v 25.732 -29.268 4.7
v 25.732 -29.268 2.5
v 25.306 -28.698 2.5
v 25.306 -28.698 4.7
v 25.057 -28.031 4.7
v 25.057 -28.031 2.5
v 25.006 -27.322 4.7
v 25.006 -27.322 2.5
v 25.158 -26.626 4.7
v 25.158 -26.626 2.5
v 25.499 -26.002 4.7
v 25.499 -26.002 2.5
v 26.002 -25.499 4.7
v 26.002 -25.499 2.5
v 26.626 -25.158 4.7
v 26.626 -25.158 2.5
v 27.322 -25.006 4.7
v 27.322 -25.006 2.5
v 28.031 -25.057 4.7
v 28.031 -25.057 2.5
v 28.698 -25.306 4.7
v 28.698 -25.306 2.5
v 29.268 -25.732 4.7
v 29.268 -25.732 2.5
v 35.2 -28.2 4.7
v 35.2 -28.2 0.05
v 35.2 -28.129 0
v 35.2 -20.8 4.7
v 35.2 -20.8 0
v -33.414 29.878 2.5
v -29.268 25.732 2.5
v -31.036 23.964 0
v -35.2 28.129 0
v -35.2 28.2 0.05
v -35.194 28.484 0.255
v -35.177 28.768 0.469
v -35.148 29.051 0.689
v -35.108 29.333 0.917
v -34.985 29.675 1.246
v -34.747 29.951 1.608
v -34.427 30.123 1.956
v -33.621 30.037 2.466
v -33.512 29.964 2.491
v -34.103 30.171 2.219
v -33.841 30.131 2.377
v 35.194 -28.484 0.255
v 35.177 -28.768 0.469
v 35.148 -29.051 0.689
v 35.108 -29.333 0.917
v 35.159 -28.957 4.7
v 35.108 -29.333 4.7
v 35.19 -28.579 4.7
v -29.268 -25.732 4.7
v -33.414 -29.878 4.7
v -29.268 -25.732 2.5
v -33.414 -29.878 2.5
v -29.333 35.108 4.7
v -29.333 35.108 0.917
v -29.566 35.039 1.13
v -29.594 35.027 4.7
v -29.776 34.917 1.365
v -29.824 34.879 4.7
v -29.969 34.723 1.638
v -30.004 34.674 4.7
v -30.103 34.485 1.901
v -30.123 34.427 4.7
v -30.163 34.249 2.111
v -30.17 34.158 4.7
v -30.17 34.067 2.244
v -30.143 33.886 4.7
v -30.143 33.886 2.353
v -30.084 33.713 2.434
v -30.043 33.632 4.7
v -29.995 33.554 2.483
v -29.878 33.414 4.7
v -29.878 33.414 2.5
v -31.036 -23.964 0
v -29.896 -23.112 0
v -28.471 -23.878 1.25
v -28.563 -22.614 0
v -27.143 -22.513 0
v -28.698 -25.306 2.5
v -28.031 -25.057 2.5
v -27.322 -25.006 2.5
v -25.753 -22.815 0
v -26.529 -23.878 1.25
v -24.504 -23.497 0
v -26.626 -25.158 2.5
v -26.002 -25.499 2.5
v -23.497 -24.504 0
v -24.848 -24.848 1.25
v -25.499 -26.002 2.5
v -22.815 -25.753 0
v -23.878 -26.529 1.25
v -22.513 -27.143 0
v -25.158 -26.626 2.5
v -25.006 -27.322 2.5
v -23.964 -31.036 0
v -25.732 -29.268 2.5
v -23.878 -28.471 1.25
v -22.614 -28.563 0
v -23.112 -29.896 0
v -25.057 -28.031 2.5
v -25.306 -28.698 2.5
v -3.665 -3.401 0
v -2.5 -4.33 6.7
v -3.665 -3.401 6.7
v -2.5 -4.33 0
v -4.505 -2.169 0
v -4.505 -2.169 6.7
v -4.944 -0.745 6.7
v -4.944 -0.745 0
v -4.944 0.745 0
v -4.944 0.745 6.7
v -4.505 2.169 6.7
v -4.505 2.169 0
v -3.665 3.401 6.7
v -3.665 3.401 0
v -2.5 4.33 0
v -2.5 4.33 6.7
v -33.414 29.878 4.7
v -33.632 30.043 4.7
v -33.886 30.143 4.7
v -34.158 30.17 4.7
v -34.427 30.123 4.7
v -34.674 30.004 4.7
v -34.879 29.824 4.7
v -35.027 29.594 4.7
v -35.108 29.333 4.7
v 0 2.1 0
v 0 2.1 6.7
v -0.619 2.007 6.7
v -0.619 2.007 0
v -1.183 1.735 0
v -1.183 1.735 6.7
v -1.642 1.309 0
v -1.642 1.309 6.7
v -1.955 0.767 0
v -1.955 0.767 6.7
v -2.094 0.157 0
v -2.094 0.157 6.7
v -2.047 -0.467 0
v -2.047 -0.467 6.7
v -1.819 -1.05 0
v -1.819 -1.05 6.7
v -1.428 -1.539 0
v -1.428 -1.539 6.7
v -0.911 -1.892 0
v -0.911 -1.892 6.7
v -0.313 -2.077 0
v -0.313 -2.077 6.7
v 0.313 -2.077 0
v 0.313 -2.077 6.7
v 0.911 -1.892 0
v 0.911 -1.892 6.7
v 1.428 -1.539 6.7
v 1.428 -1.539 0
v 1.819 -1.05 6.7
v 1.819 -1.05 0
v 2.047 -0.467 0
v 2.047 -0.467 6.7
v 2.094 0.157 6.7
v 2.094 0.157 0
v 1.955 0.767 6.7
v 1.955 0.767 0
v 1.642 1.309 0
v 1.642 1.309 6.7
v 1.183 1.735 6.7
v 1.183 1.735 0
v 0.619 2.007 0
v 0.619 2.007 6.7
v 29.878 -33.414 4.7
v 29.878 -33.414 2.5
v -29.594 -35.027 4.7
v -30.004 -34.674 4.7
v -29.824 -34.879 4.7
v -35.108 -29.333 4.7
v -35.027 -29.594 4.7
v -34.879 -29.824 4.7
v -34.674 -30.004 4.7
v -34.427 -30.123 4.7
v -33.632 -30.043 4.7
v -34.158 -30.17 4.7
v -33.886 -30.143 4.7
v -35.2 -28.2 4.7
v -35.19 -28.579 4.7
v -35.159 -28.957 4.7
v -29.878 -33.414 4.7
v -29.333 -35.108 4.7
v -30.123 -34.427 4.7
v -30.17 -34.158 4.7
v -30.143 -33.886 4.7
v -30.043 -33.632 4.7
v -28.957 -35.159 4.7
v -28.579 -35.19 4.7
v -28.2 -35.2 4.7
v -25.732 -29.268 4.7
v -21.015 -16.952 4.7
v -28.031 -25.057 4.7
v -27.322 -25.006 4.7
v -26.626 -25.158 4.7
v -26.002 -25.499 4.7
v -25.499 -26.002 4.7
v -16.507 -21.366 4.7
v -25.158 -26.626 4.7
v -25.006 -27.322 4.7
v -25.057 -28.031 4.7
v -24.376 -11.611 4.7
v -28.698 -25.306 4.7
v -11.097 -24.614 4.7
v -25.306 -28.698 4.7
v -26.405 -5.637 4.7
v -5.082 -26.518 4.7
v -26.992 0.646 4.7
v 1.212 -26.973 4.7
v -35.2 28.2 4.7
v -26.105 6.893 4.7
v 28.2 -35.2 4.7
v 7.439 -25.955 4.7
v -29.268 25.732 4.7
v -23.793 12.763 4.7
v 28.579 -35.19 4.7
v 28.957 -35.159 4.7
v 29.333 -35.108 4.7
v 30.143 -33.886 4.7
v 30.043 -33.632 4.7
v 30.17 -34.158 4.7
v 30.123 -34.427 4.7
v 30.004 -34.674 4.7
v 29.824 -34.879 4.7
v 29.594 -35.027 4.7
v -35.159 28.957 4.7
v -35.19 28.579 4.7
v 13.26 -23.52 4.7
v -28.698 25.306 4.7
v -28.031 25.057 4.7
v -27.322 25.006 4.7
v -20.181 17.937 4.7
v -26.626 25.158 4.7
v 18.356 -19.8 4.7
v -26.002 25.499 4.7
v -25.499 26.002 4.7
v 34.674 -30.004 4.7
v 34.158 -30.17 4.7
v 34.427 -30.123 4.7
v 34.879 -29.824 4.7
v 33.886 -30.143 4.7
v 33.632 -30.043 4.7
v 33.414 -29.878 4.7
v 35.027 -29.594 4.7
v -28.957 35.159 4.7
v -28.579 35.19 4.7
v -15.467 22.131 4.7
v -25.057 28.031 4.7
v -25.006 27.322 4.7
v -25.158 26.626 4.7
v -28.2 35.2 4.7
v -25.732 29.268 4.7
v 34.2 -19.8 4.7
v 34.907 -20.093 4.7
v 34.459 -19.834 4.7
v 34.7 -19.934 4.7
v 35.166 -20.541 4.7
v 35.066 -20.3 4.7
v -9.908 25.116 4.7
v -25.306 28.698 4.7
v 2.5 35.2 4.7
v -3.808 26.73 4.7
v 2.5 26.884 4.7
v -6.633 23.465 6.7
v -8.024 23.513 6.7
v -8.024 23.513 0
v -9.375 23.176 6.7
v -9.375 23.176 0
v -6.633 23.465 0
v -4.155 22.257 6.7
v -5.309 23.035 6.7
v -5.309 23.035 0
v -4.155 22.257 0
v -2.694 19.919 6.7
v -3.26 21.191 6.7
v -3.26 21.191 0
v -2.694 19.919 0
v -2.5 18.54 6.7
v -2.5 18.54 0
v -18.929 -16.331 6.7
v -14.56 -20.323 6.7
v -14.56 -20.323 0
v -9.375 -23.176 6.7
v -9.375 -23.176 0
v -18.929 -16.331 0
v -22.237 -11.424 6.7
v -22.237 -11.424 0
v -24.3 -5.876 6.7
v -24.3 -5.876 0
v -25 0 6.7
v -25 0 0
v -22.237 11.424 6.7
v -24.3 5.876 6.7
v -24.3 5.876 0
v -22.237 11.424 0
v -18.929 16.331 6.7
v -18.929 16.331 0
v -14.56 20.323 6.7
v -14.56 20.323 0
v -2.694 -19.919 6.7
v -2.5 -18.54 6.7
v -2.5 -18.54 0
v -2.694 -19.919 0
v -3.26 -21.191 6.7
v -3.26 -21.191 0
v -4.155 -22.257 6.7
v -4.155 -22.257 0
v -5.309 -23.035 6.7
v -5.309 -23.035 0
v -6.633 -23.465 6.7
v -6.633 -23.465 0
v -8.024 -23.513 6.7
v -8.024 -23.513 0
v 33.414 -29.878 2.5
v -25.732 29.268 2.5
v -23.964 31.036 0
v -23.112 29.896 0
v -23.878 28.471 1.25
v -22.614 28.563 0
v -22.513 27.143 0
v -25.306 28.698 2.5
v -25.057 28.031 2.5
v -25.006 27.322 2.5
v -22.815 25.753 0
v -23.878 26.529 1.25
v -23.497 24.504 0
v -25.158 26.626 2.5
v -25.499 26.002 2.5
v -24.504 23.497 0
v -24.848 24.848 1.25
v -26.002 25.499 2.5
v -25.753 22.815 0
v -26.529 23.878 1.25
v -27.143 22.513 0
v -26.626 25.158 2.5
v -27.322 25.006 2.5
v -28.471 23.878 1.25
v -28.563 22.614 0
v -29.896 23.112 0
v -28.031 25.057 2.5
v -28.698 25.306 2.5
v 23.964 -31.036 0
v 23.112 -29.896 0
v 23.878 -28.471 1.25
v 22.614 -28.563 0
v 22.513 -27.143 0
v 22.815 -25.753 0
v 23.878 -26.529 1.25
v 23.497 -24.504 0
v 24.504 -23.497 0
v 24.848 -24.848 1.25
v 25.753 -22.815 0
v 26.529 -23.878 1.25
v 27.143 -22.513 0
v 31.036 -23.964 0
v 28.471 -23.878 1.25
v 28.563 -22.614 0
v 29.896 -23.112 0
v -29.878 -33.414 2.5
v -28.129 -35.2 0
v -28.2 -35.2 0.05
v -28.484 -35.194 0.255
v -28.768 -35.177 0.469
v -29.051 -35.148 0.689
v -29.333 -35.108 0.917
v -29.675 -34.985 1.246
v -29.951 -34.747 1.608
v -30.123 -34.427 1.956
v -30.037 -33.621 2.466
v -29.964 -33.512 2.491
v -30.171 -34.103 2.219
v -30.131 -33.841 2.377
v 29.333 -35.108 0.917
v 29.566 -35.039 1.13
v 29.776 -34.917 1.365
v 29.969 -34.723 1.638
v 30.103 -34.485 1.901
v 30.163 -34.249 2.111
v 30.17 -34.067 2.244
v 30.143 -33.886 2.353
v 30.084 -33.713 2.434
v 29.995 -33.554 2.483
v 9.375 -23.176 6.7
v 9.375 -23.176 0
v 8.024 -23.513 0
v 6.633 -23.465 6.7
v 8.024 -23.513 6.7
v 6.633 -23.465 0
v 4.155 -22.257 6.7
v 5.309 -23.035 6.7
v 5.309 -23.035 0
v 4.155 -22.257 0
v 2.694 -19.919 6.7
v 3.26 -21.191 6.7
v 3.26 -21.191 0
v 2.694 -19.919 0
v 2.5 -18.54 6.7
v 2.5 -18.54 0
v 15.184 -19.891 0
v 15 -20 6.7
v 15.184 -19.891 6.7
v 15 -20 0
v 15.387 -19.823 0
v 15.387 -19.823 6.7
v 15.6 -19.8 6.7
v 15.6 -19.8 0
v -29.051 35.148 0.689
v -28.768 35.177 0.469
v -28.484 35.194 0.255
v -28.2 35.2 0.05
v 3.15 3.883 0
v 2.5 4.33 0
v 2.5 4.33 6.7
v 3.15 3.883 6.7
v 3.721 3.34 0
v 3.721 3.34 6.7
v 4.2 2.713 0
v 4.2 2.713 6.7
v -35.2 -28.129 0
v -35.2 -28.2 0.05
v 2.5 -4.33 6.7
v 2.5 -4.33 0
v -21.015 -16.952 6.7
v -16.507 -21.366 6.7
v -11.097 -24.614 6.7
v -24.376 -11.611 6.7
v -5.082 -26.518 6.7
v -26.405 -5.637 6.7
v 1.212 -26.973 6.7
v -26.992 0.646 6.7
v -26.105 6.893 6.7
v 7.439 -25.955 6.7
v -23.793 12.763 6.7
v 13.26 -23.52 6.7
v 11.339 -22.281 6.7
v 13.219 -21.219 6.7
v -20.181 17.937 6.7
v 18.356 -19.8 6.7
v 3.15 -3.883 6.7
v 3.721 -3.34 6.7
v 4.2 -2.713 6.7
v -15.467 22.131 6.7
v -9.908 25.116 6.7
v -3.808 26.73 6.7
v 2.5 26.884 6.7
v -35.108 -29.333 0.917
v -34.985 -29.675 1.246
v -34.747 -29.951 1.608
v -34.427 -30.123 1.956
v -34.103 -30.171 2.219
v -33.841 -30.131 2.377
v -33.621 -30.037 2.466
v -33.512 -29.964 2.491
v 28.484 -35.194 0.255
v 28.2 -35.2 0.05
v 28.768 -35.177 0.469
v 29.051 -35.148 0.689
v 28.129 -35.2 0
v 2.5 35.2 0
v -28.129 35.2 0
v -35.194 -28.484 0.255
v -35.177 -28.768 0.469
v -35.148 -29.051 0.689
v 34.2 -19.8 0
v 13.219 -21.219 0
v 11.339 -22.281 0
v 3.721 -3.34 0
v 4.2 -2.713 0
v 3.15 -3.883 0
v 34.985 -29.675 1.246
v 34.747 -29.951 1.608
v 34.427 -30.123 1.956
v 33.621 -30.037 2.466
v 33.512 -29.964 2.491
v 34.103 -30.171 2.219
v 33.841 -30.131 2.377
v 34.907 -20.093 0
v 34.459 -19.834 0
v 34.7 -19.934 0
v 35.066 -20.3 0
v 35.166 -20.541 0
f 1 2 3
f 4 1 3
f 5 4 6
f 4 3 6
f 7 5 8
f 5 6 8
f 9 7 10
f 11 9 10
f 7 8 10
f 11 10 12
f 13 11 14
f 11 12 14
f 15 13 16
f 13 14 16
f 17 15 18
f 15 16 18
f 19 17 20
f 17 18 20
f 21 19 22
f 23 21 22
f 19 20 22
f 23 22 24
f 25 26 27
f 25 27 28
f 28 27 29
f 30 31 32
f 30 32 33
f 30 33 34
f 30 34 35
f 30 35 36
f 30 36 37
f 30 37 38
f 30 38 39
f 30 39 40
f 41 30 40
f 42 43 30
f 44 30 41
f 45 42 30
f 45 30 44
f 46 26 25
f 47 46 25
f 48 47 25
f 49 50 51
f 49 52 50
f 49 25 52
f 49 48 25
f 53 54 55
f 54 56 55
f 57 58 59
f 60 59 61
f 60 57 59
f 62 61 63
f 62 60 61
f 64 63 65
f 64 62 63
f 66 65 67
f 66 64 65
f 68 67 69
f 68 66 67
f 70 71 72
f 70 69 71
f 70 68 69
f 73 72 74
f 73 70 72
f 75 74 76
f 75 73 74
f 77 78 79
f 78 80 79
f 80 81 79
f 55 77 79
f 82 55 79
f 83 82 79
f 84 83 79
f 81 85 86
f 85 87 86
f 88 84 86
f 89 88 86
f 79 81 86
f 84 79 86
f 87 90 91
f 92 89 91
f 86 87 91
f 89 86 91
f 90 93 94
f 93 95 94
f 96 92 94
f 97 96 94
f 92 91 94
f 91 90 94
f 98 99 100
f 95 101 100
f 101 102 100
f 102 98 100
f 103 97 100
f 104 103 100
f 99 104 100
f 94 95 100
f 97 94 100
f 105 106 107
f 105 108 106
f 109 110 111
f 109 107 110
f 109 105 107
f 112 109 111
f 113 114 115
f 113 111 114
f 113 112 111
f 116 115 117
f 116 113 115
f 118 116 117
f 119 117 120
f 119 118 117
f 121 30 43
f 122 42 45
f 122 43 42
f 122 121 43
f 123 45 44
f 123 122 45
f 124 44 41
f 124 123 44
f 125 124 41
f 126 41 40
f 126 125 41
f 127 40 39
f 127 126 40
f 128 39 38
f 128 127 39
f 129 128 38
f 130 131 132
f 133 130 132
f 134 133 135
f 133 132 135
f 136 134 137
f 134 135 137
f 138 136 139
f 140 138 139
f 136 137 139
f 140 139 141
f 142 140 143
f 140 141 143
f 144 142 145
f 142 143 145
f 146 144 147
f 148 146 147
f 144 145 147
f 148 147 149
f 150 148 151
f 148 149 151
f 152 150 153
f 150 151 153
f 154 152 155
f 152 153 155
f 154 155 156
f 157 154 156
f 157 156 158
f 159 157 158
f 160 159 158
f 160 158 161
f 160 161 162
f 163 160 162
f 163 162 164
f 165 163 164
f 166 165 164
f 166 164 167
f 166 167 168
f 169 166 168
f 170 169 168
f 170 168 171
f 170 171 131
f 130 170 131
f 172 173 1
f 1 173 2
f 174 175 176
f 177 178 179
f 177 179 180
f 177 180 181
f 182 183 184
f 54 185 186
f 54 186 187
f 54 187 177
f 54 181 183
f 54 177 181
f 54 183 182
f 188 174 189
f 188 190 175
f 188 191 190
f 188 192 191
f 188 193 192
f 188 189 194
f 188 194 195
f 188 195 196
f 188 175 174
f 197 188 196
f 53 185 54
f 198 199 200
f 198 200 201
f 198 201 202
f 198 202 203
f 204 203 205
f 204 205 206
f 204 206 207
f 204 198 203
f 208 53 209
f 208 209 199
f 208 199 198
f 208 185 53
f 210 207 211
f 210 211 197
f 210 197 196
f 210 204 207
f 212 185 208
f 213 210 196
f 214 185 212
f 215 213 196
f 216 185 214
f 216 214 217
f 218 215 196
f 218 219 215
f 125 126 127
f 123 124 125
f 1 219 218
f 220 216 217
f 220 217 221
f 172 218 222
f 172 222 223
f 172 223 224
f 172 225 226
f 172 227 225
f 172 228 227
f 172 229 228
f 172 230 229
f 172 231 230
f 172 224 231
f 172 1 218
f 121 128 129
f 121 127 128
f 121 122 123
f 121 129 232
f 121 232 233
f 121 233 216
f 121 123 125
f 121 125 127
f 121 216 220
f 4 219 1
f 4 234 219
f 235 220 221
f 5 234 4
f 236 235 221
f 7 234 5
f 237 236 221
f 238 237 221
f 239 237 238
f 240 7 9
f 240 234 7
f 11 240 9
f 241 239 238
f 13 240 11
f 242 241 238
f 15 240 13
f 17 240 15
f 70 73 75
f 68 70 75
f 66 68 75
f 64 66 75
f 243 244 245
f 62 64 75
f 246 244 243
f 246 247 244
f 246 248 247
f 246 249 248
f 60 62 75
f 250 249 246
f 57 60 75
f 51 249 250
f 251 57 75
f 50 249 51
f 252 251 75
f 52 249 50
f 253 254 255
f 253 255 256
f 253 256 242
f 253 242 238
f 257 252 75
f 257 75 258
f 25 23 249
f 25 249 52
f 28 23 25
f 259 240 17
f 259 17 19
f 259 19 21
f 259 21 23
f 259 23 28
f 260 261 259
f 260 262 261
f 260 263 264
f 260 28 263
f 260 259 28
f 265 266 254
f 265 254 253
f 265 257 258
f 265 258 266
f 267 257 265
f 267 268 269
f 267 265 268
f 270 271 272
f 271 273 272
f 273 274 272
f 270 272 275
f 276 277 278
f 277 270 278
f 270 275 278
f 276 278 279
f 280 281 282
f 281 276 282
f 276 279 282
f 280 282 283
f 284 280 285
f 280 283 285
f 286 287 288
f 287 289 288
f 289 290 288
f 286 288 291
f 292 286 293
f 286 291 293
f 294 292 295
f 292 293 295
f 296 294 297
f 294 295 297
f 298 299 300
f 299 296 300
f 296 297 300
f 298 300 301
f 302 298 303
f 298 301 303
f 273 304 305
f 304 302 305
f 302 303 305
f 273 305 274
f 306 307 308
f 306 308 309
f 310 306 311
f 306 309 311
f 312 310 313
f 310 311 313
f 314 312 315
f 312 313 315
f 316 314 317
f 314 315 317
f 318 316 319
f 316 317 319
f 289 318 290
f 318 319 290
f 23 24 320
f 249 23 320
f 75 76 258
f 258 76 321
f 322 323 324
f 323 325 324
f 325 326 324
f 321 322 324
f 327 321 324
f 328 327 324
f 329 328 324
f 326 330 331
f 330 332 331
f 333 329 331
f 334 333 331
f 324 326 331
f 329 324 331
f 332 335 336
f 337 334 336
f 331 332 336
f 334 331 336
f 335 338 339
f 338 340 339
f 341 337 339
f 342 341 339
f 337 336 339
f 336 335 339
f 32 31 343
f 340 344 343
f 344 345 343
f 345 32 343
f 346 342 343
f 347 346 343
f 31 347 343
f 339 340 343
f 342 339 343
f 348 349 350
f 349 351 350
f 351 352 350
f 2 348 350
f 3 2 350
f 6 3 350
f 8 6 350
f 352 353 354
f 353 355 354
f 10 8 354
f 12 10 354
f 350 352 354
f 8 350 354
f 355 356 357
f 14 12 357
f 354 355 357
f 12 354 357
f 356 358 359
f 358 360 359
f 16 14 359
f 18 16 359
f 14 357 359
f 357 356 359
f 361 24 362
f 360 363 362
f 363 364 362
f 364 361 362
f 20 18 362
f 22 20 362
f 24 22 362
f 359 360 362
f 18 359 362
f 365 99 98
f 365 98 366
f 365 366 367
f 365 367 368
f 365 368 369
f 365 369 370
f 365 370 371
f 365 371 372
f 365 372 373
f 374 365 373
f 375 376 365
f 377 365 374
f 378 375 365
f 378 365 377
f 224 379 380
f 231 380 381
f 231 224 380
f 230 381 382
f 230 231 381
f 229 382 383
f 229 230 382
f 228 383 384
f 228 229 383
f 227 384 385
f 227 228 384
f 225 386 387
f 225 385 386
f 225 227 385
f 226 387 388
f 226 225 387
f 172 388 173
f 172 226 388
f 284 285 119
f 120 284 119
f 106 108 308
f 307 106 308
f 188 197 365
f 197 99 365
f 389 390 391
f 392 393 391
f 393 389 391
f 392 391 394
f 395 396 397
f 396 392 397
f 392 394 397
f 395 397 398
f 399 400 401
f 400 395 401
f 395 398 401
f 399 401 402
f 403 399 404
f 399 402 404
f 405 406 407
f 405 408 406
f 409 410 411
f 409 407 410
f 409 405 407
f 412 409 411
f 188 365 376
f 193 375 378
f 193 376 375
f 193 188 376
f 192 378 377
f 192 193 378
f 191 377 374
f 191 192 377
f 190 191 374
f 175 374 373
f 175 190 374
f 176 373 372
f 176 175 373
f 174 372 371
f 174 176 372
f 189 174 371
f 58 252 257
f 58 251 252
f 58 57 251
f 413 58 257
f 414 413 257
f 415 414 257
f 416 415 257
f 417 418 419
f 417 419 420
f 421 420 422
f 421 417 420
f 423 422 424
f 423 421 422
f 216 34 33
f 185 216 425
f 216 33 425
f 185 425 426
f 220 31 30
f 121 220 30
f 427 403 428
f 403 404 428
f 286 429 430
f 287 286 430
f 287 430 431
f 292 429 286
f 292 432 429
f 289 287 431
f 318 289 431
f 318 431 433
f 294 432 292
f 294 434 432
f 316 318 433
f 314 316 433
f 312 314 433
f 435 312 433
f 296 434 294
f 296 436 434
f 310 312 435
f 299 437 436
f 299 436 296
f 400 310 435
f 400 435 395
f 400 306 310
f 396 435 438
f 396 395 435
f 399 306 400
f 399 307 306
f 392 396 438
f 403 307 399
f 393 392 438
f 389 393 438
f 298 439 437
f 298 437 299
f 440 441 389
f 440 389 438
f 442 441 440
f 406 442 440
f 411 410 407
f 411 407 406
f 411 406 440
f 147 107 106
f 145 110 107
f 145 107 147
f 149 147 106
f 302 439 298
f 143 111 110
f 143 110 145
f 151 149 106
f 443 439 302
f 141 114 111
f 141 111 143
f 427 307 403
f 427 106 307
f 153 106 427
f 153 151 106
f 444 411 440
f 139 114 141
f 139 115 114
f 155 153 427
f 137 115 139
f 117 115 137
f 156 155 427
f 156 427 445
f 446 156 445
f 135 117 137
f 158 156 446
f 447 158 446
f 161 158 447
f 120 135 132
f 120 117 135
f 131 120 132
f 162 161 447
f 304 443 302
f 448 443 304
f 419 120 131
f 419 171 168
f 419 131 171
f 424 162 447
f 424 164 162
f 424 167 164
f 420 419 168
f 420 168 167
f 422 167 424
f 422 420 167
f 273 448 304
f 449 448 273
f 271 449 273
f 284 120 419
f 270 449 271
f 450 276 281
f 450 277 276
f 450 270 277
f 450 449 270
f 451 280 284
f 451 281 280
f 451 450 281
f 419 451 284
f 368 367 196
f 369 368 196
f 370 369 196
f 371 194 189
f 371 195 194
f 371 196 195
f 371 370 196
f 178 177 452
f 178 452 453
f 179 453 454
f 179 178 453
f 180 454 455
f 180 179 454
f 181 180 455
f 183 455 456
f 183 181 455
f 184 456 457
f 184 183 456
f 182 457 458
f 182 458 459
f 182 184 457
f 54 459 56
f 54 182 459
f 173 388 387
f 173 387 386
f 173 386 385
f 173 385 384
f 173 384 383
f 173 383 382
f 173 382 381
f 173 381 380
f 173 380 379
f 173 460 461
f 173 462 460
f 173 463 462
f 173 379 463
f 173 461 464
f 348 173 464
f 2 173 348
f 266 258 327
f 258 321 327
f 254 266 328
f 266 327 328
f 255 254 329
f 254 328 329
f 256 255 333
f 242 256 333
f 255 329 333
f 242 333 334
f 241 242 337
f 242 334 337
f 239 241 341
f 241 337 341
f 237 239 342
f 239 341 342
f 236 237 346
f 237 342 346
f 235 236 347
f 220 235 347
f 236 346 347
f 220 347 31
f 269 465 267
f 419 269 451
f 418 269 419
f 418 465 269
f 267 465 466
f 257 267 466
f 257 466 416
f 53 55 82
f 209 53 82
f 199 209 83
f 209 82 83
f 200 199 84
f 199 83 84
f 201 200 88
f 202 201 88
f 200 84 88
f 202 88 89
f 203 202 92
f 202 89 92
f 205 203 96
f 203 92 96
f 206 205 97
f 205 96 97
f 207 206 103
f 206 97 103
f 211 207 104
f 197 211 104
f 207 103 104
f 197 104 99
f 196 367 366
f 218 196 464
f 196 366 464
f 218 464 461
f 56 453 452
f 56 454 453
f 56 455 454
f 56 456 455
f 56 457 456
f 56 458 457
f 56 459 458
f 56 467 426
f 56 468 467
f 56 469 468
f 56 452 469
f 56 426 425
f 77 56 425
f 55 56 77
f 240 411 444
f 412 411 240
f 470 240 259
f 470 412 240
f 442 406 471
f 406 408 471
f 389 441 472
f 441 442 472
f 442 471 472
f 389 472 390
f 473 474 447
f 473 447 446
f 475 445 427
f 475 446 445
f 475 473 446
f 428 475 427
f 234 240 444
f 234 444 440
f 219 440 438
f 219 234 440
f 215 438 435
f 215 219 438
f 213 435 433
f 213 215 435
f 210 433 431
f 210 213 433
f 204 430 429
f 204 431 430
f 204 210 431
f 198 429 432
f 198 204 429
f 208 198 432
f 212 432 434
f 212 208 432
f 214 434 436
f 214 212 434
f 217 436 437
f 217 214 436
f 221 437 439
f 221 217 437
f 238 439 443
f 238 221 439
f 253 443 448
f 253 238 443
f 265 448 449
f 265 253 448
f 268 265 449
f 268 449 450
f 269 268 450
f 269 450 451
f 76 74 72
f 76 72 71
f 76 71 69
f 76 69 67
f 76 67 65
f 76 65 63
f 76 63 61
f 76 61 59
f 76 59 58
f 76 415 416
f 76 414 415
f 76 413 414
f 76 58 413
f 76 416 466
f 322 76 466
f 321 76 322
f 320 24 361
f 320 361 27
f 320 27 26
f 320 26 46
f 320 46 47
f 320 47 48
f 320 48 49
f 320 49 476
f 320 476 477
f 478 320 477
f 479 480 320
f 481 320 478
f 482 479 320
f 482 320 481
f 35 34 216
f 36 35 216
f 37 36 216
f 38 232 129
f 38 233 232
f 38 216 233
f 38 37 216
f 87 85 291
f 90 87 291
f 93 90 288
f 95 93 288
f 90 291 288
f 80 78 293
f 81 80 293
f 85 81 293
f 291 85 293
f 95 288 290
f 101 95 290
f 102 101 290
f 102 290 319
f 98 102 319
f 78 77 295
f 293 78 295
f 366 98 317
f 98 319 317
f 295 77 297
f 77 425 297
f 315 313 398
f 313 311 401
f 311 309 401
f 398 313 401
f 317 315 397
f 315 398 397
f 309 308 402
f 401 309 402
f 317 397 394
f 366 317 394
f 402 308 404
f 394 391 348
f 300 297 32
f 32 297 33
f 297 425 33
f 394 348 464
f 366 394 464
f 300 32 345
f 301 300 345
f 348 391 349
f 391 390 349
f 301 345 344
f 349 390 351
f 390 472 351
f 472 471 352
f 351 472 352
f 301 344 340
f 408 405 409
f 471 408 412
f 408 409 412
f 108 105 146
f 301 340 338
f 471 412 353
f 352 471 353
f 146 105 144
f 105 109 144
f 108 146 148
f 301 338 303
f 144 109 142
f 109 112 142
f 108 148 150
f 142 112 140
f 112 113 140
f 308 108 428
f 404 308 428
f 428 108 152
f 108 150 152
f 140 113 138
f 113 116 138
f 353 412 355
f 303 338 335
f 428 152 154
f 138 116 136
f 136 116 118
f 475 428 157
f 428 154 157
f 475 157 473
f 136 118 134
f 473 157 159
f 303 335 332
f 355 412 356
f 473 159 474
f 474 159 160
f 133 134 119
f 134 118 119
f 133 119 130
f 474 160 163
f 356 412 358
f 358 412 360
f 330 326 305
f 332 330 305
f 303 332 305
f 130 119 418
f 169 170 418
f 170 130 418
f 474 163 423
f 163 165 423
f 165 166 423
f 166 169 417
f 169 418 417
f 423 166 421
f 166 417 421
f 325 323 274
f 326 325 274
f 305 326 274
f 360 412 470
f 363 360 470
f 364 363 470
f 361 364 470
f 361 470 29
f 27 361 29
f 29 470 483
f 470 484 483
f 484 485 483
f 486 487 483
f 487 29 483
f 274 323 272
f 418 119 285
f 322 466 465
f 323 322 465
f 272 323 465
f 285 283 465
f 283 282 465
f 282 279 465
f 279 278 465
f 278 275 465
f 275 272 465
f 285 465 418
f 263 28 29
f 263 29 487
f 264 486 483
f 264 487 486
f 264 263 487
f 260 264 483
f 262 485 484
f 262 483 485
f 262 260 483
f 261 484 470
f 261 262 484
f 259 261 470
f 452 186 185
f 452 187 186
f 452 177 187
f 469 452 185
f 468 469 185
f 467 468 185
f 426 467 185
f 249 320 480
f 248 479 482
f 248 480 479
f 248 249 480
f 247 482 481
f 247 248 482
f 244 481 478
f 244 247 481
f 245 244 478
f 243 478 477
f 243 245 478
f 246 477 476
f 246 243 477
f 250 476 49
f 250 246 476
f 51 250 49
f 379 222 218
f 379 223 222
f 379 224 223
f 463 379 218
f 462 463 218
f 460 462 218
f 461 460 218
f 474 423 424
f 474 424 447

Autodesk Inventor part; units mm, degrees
ref_plane "YZ Plane" through (0, 0, 0) normal (1, 0, 0) x (0, 1, 0)
ref_plane "XZ Plane" through (0, 0, 0) normal (0, 1, 0) x (-1, 0, 0)
ref_plane "XY Plane" through (0, 0, 0) normal (0, 0, 1) x (1, 0, 0)
sketch "Sketch1" plane through (0, 0, 0) normal (0, 0, 1) x (1, 0, 0)
  line L0 (-28.2, -35.2) -> (28.2, -35.2)
  line L1 (35.2, -28.2) -> (35.2, 28.2)
  line L2 (28.2, 35.2) -> (-28.2, 35.2)
  line L3 (-35.2, 28.2) -> (-35.2, -28.2)
  line L4 (-35.2, -35.2) -> (35.2, 35.2) construction
  line L5 (35.2, -35.2) -> (-35.2, 35.2) construction
  arc A0 (-28.2, 35.2) -> (-35.2, 28.2) centre (-28.2, 28.2) ccw
  arc A1 (35.2, 28.2) -> (28.2, 35.2) centre (28.2, 28.2) ccw
  arc A2 (-35.2, -28.2) -> (-28.2, -35.2) centre (-28.2, -28.2) ccw
  arc A3 (28.2, -35.2) -> (35.2, -28.2) centre (28.2, -28.2) ccw
  line L6 (-2.5, -24.8747) -> (2.5, -24.8747) construction
  line L7 (2.5, 24.8747) -> (-2.5, 24.8747) construction
  line L8 (-2.5, -24.8747) -> (2.5, 24.8747) construction
  line L9 (2.5, -24.8747) -> (-2.5, 24.8747) construction
  arc A4 (-9.375, 23.1756) -> (-9.375, -23.1756) centre (0, 0) ccw
  arc A5 (9.375, -23.1756) -> (9.375, 23.1756) centre (0, 0) ccw
  arc A6 (-2.5, 18.5405) -> (-9.375, 23.1756) centre (-7.5, 18.5405) ccw
  arc A7 (9.375, 23.1756) -> (2.5, 18.5405) centre (7.5, 18.5405) ccw
  arc A8 (-9.375, -23.1756) -> (-2.5, -18.5405) centre (-7.5, -18.5405) ccw
  arc A9 (2.5, -18.5405) -> (9.375, -23.1756) centre (7.5, -18.5405) ccw
  line L10 (2.5, 4.3301) -> (2.5, 18.5405)
  line L11 (-2.5, 18.5405) -> (-2.5, 4.3301)
  line L12 (-2.5, -4.3301) -> (-2.5, -18.5405)
  line L13 (2.5, -18.5405) -> (2.5, -4.3301)
  arc A10 (-2.5, 4.3301) -> (-2.5, -4.3301) centre (0, 0) ccw
  arc A11 (2.5, -4.3301) -> (2.5, 4.3301) centre (0, 0) ccw
  dimension "d0" = 70.4
  dimension "d1" = 7
  dimension "d3" = 5
  dimension "d4" = 25
  dimension "d5" = 5
  dimension "d7" = 5
extrude "Extrusion1" add sketch "Sketch1" along normal blind 4.7
sketch "Sketch2" plane through (0, 0, 4.7) normal (0, 0, 1) x (1, 0, 0)
  circle A0 centre (0, 0) radius 27
  arc A1 (9.375, -23.1756) -> (9.375, 23.1756) centre (0, 0) ccw projected
  arc A2 (2.5, -18.5405) -> (9.375, -23.1756) centre (7.5, -18.5405) ccw projected
  line L0 (2.5, -18.5405) -> (2.5, -4.3301) projected
  arc A3 (2.5, -4.3301) -> (2.5, 4.3301) centre (0, 0) ccw projected
  line L1 (2.5, 4.3301) -> (2.5, 18.5405) projected
  arc A4 (9.375, 23.1756) -> (2.5, 18.5405) centre (7.5, 18.5405) ccw projected
  line L2 (-2.5, 18.5405) -> (-2.5, 4.3301) projected
  arc A5 (-2.5, 4.3301) -> (-2.5, -4.3301) centre (0, 0) ccw projected
  line L3 (-2.5, -4.3301) -> (-2.5, -18.5405) projected
  arc A6 (-9.375, -23.1756) -> (-2.5, -18.5405) centre (-7.5, -18.5405) ccw projected
  arc A7 (-9.375, 23.1756) -> (-9.375, -23.1756) centre (0, 0) ccw projected
  arc A8 (-2.5, 18.5405) -> (-9.375, 23.1756) centre (-7.5, 18.5405) ccw projected
  line L4 (28.2, 35.2) -> (-28.2, 35.2) projected
  arc A9 (-28.2, 35.2) -> (-35.2, 28.2) centre (-28.2, 28.2) ccw projected
  line L5 (-35.2, 28.2) -> (-35.2, -28.2) projected
  arc A10 (-35.2, -28.2) -> (-28.2, -35.2) centre (-28.2, -28.2) ccw projected
  line L6 (-28.2, -35.2) -> (28.2, -35.2) projected
  arc A11 (28.2, -35.2) -> (35.2, -28.2) centre (28.2, -28.2) ccw projected
  line L7 (35.2, -28.2) -> (35.2, 28.2) projected
  arc A12 (35.2, 28.2) -> (28.2, 35.2) centre (28.2, 28.2) ccw projected
  dimension "d10" = 54
extrude "Extrusion2" add sketch "Sketch2" along normal blind 2 contours A0
sketch "Sketch3" plane through (0, 0, 0) normal (0, 0, -1) x (-1, 0, 0)
  line L0 (-27.5, -27.5) -> (27.5, -27.5) construction
  line L1 (27.5, -27.5) -> (27.5, 27.5) construction
  line L2 (27.5, 27.5) -> (-27.5, 27.5) construction
  line L3 (-27.5, 27.5) -> (-27.5, -27.5) construction
  line L4 (-27.5, -27.5) -> (27.5, 27.5) construction
  line L5 (27.5, -27.5) -> (-27.5, 27.5) construction
  line L6 (27.5, 27.5) -> (32.8233, 32.8233) construction
  line L7 (29.2678, 25.7322) -> (34.5911, 31.0555)
  line L8 (31.0555, 34.5911) -> (25.7322, 29.2678)
  arc A0 (25.7322, 29.2678) -> (29.2678, 25.7322) centre (27.5, 27.5) ccw
  arc A1 (34.5911, 31.0555) -> (31.0555, 34.5911) centre (32.8233, 32.8233) ccw
  arc A2 (35.2, 28.2) -> (28.2, 35.2) centre (28.2, 28.2) ccw construction
  line L9 (-25.7322, 29.2678) -> (-31.0555, 34.5911)
  arc A3 (-29.2678, 25.7322) -> (-25.7322, 29.2678) centre (-27.5, 27.5) ccw
  line L10 (-34.5911, 31.0555) -> (-29.2678, 25.7322)
  arc A4 (-31.0555, 34.5911) -> (-34.5911, 31.0555) centre (-32.8233, 32.8233) ccw
  line L11 (-29.2678, -25.7322) -> (-34.5911, -31.0555)
  arc A5 (-25.7322, -29.2678) -> (-29.2678, -25.7322) centre (-27.5, -27.5) ccw
  line L12 (-31.0555, -34.5911) -> (-25.7322, -29.2678)
  arc A6 (-34.5911, -31.0555) -> (-31.0555, -34.5911) centre (-32.8233, -32.8233) ccw
  line L13 (25.7322, -29.2678) -> (31.0555, -34.5911)
  arc A7 (29.2678, -25.7322) -> (25.7322, -29.2678) centre (27.5, -27.5) ccw
  line L14 (34.5911, -31.0555) -> (29.2678, -25.7322)
  arc A8 (31.0555, -34.5911) -> (34.5911, -31.0555) centre (32.8233, -32.8233) ccw
  point P0 (0, 0)
  point P1 (30.1617, 30.1617)
  dimension "d13" = 55
  dimension "d14" = 5
  dimension "d18" = 360
extrude "Extrusion3" cut sketch "Sketch3" against normal through all
chamfer "Chamfer1" distance 2.5 angle 45 12 edges at (28.3939, 31.9294, 0) (25.7322, 25.7322, 0) (31.9294, 28.3939, 0) (-28.3939, 31.9294, 0) (-25.7322, 25.7322, 0) (-31.9294, 28.3939, 0) (-25.7322, -25.7322, 0) (-31.9294, -28.3939, 0) (-28.3939, -31.9294, 0) (25.7322, -25.7322, 0) (28.3939, -31.9294, 0) (31.9294, -28.3939, 0)
fillet "Fillet1" radius 1 8 edges at (31.0555, 34.5911, 3.6) (34.5911, 31.0555, 3.6) (34.5911, -31.0555, 3.6) (31.0555, -34.5911, 3.6) (-31.0555, -34.5911, 3.6) (-34.5911, -31.0555, 3.6) (-34.5911, 31.0555, 3.6) (-31.0555, 34.5911, 3.6)
hole "Hole1" at (0, 0, 0) direction (0, 0, 1) diameter 4.2 end through all
sketch "Sketch4" plane through (0, 0, 0) normal (0, 0, -1) x (-1, 0, 0)
  line L0 (-35.2, 35.2) -> (-2.5, 35.2)
  line L1 (-2.5, 35.2) -> (-2.5, 4.3301)
  line L2 (-2.5, 4.3301) -> (-4.2, 4.3301)
  line L3 (-4.2, 4.3301) -> (-4.2, -19.8)
  line L4 (-4.2, -19.8) -> (-35.2, -19.8)
  line L5 (-35.2, 28.1289) -> (-35.2, -28.1289) construction
  line L6 (-35.2, 35.2) -> (-35.2, -19.8)
  line L7 (-2.5, 18.5405) -> (-2.5, 4.3301) projected
  line L8 (28.1289, 35.2) -> (-28.1289, 35.2) construction
  point P0 (0, 0)
  point P1 (2.5, 4.3301)
  dimension "d39" = 31
  dimension "d41" = 55
extrude "Extrusion4" cut sketch "Sketch4" against normal through all
fillet "Fillet2" radius 1 2 edges at (35.2, -19.8, 2.35) (15.263, -19.8, 3.35)
equation "\"Offset\" = 0.3"
properties part number "V4 In wall"
